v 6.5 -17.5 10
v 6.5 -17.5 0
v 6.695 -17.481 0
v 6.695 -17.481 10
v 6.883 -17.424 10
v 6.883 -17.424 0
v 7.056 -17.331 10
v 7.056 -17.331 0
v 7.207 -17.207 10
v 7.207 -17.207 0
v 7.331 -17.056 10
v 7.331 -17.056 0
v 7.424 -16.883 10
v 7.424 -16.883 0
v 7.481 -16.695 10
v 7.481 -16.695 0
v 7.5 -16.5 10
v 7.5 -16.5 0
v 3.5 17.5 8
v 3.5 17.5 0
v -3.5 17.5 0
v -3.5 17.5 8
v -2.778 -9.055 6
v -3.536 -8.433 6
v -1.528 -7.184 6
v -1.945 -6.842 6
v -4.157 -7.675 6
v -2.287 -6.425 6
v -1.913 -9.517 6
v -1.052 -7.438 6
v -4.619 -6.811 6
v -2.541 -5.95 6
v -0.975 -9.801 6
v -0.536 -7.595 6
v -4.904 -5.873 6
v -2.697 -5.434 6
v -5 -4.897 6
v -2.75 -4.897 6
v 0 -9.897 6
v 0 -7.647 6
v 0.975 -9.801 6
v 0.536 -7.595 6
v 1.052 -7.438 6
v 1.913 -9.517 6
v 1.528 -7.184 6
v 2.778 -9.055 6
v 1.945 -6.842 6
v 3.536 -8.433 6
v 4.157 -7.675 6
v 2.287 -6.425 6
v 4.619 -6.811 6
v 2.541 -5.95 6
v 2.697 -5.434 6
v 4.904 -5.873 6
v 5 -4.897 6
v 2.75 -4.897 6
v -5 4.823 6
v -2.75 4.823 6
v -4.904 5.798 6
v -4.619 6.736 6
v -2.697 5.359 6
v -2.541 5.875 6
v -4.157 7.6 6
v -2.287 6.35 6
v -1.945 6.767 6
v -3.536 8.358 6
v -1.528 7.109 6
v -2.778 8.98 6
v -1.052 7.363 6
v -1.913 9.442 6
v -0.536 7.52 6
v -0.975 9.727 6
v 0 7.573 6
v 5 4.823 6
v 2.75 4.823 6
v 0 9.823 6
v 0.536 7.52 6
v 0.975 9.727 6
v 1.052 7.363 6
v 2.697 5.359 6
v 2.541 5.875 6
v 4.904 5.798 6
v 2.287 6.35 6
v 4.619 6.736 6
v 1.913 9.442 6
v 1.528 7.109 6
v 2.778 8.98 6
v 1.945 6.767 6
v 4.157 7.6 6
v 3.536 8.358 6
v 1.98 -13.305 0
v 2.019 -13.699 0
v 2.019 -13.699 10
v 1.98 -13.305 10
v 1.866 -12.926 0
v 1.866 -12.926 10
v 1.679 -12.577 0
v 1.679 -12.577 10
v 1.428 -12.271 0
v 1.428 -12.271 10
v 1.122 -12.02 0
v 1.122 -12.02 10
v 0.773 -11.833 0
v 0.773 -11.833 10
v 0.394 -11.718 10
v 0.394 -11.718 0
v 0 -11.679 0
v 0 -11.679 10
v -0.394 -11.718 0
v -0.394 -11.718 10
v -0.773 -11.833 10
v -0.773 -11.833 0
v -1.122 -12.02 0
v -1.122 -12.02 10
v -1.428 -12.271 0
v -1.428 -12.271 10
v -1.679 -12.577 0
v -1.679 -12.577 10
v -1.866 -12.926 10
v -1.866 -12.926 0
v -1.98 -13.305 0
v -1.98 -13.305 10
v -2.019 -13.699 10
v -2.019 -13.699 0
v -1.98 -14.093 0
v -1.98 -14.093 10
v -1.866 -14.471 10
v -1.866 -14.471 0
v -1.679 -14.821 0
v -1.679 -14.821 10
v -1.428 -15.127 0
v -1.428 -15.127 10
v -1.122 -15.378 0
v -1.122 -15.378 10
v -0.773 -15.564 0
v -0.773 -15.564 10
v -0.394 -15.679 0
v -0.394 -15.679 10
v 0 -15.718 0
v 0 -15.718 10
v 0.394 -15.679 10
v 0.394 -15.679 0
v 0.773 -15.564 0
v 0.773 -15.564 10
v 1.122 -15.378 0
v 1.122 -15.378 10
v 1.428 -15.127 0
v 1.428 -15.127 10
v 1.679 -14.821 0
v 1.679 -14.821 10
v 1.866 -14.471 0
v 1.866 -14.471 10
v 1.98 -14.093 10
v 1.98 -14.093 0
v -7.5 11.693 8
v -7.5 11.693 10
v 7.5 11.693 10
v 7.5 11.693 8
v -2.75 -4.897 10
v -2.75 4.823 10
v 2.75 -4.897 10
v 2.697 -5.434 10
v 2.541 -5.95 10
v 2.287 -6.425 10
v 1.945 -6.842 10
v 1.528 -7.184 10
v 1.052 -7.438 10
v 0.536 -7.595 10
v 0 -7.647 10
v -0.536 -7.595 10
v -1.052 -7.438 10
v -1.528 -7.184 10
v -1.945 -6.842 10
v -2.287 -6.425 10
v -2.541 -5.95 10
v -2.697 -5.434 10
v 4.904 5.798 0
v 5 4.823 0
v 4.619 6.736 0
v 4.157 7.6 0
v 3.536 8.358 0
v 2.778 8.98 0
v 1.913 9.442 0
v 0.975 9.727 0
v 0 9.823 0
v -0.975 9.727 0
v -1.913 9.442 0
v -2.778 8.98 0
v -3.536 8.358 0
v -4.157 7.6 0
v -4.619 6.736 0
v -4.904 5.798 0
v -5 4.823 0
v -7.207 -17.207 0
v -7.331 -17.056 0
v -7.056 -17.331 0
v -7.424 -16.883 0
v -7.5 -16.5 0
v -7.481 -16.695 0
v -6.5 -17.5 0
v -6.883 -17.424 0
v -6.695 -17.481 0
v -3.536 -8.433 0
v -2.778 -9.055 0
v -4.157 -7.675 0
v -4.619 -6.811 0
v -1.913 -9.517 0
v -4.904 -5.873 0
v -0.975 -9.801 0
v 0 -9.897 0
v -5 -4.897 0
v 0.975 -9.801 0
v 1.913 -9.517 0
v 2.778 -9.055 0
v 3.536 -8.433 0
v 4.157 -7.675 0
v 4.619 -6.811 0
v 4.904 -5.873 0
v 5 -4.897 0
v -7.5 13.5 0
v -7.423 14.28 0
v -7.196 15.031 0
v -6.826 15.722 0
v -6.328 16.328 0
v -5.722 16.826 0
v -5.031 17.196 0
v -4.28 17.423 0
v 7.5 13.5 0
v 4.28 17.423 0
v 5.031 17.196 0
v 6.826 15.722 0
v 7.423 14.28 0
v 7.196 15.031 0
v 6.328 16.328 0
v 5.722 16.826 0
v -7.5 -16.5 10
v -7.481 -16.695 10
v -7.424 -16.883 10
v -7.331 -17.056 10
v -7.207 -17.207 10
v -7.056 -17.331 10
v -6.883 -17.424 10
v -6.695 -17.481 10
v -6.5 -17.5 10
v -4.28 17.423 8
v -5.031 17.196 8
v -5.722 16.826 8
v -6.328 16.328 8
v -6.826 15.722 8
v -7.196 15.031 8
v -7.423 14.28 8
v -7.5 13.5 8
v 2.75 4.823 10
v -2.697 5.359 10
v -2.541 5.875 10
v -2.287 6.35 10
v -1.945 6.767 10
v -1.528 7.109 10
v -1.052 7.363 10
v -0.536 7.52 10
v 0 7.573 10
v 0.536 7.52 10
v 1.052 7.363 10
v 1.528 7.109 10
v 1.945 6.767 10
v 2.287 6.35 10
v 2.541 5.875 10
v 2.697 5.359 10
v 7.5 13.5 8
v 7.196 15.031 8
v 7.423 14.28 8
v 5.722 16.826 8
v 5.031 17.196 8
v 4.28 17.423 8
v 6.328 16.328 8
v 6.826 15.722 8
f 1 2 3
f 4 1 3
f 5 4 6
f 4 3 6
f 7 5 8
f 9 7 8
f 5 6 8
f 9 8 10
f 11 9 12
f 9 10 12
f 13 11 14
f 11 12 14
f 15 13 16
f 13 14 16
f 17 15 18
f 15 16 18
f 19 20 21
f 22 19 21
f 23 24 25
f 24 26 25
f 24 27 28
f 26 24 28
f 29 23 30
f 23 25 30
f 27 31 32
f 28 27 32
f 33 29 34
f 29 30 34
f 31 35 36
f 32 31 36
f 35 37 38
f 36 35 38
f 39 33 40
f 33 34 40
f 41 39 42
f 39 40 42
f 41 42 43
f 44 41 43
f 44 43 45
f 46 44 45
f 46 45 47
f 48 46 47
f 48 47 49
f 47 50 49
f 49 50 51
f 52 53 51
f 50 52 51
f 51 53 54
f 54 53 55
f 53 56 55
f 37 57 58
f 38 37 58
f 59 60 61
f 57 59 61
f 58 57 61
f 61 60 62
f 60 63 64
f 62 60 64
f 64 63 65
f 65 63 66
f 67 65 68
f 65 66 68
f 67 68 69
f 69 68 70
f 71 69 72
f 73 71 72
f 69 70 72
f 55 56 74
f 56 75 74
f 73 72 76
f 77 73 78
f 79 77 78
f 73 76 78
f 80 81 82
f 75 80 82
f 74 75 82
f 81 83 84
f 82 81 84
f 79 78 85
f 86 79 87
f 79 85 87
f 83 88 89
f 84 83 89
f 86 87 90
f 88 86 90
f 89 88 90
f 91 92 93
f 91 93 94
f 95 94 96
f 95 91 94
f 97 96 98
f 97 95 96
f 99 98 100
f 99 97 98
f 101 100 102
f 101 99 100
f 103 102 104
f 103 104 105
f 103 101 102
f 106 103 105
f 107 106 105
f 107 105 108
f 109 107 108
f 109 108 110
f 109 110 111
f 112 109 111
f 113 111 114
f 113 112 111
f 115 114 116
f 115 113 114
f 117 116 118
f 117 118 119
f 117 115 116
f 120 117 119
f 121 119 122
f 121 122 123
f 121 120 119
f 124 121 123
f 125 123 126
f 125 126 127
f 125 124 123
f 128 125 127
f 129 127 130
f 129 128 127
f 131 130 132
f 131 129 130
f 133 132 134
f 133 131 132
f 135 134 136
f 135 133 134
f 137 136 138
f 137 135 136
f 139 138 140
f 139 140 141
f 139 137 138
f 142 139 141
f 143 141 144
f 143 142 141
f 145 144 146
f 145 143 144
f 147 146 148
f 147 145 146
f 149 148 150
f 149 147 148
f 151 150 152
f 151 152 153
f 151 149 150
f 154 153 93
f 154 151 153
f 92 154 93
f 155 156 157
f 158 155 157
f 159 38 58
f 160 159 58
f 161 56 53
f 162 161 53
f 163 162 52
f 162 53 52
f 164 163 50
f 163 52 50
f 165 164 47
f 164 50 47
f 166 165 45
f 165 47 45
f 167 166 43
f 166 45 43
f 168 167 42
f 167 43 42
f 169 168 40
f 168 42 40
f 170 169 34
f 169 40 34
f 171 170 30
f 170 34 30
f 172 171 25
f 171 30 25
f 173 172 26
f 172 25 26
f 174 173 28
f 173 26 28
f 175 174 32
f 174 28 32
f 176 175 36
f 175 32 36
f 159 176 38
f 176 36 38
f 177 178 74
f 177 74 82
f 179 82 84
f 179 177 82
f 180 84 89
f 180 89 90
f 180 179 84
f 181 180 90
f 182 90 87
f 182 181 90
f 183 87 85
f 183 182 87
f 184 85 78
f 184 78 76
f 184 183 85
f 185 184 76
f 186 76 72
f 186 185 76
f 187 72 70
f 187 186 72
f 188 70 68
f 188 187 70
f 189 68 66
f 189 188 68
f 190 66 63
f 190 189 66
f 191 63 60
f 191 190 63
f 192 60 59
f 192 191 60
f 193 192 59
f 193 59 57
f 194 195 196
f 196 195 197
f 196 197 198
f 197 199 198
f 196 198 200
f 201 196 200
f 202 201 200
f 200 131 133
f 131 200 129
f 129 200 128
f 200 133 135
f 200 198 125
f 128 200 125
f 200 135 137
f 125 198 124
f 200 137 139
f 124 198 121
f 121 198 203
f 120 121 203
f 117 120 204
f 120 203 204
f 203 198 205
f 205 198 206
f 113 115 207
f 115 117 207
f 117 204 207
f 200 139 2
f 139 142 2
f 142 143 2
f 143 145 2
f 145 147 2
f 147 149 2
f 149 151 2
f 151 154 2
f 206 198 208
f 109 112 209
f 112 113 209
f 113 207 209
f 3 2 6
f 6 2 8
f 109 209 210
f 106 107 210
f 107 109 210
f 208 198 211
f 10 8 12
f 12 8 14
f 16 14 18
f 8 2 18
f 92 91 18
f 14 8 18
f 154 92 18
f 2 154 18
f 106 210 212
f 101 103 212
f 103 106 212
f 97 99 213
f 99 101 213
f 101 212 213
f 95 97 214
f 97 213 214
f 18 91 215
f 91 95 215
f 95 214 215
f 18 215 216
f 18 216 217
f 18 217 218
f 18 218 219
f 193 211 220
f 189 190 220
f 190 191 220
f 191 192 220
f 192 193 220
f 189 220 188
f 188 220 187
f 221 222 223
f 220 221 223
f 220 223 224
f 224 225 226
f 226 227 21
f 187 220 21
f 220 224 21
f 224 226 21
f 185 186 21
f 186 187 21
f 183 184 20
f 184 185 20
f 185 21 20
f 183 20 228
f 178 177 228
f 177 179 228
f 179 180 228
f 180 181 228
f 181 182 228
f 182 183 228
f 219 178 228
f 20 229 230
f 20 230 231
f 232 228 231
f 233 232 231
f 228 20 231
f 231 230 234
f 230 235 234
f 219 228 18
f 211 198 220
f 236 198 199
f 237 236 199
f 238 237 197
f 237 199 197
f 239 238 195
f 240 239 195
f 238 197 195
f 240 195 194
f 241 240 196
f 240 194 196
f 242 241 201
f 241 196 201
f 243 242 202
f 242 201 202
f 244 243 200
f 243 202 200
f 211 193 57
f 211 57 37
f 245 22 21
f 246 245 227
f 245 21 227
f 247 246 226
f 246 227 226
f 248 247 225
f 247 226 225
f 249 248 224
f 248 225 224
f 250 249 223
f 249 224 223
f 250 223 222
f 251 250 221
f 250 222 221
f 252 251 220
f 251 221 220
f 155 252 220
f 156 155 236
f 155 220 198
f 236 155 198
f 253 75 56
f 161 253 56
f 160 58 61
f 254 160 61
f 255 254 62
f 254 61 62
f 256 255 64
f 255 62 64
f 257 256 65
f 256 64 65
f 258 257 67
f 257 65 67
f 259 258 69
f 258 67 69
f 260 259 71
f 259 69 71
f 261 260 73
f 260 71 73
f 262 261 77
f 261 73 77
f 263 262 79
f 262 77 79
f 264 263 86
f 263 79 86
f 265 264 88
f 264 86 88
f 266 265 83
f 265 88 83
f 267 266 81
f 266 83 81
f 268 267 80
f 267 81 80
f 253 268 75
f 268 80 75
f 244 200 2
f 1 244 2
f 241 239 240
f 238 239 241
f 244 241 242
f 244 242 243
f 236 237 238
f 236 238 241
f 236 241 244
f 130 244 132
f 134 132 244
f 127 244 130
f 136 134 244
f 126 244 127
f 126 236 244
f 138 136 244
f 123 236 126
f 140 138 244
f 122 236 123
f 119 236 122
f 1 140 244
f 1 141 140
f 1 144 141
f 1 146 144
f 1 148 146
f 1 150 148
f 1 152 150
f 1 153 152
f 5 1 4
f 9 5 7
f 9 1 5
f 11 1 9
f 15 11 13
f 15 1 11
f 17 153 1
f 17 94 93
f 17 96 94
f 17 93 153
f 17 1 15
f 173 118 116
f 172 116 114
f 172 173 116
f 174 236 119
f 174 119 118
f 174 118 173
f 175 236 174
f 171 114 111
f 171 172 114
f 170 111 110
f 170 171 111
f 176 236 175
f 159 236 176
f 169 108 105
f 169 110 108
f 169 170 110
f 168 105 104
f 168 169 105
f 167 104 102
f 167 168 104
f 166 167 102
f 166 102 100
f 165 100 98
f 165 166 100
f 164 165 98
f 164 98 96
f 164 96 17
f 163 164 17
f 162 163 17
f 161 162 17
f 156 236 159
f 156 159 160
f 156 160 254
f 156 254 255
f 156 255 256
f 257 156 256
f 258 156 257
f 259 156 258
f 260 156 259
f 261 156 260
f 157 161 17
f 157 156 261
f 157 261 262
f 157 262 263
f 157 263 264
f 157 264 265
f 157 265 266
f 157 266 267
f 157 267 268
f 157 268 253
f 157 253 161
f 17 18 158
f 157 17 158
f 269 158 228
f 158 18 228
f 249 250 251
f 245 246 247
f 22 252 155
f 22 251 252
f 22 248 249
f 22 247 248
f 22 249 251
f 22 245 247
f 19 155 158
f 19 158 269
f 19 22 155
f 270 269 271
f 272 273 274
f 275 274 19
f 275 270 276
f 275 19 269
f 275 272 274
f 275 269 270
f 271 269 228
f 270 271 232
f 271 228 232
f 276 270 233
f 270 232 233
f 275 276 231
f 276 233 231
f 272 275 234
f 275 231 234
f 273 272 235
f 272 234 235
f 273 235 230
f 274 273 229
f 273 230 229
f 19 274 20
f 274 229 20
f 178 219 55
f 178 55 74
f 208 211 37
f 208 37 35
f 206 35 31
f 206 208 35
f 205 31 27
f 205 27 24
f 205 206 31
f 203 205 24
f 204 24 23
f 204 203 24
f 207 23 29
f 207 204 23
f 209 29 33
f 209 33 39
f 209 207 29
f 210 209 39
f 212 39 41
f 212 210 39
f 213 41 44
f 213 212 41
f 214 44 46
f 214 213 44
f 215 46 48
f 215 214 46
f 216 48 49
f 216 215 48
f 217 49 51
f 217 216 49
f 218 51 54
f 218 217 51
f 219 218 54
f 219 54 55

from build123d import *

# Parameters (mm, degrees)
F0_R     = 2.0193
F1_DEPTH = 10
F2_W     = 27.966302
F2_H     = 13.370458
F3_DEPTH = 2
F4_DEPTH = 6


with BuildPart() as f1:
    # F0 (on Top) → F1 (new body)
    with BuildSketch(Plane.XY):
        with BuildLine():
            Line((-6.5, -17.5), (6.5, -17.5))
            ThreePointArc((6.5, -17.5), (7.207107, -17.207107), (7.5, -16.5))
            Line((7.5, -16.5), (7.5, 13.5))
            ThreePointArc((7.5, 13.5), (6.328427, 16.328427), (3.5, 17.5))
            Line((3.5, 17.5), (-3.5, 17.5))
            ThreePointArc((-3.5, 17.5), (-6.328427, 16.328427), (-7.5, 13.5))
            Line((-7.5, 13.5), (-7.5, -16.5))
            ThreePointArc((-7.5, -16.5), (-7.207107, -17.207107), (-6.5, -17.5))
        make_face()
        with Locations((0, -13.698686)):
            Circle(F0_R, mode=Mode.SUBTRACT)
        with BuildLine():
            Line((-5, -4.897373), (-5, 4.822578))
            ThreePointArc((-5, 4.822578), (0, 9.822578), (5, 4.822578))
            Line((5, 4.822578), (5, -4.897373))
            ThreePointArc((5, -4.897373), (0, -9.897373), (-5, -4.897373))
        make_face(mode=Mode.SUBTRACT)
        with BuildLine():
            ThreePointArc((5, 4.822578), (0, 9.822578), (-5, 4.822578))
            Line((-5, 4.822578), (-5, -4.897373))
            ThreePointArc((-5, -4.897373), (0, -9.897373), (5, -4.897373))
            Line((5, -4.897373), (5, 4.822578))
        make_face()
        with BuildLine():
            Line((-2.75, -4.897373), (-2.75, 4.822578))
            ThreePointArc((-2.75, 4.822578), (0, 7.572578), (2.75, 4.822578))
            Line((2.75, 4.822578), (2.75, -4.897373))
            ThreePointArc((2.75, -4.897373), (0, -7.647373), (-2.75, -4.897373))
        make_face(mode=Mode.SUBTRACT)
    extrude(amount=F1_DEPTH)

    # F2 (on face) → F3 (cut)
    with BuildSketch(Plane.XY.offset(10)):
        with Locations((-0.129465, 18.378206)):
            Rectangle(F2_W, F2_H)
    extrude(amount=-F3_DEPTH, mode=Mode.SUBTRACT)

    # F0 (on Top) → F4 (cut)
    with BuildSketch(Plane.XY):
        with BuildLine():
            ThreePointArc((5, 4.822578), (0, 9.822578), (-5, 4.822578))
            Line((-5, 4.822578), (-5, -4.897373))
            ThreePointArc((-5, -4.897373), (0, -9.897373), (5, -4.897373))
            Line((5, -4.897373), (5, 4.822578))
        make_face()
        with BuildLine():
            Line((-2.75, -4.897373), (-2.75, 4.822578))
            ThreePointArc((-2.75, 4.822578), (0, 7.572578), (2.75, 4.822578))
            Line((2.75, 4.822578), (2.75, -4.897373))
            ThreePointArc((2.75, -4.897373), (0, -7.647373), (-2.75, -4.897373))
        make_face(mode=Mode.SUBTRACT)
    extrude(amount=F4_DEPTH, mode=Mode.SUBTRACT)


solid = f1.part
